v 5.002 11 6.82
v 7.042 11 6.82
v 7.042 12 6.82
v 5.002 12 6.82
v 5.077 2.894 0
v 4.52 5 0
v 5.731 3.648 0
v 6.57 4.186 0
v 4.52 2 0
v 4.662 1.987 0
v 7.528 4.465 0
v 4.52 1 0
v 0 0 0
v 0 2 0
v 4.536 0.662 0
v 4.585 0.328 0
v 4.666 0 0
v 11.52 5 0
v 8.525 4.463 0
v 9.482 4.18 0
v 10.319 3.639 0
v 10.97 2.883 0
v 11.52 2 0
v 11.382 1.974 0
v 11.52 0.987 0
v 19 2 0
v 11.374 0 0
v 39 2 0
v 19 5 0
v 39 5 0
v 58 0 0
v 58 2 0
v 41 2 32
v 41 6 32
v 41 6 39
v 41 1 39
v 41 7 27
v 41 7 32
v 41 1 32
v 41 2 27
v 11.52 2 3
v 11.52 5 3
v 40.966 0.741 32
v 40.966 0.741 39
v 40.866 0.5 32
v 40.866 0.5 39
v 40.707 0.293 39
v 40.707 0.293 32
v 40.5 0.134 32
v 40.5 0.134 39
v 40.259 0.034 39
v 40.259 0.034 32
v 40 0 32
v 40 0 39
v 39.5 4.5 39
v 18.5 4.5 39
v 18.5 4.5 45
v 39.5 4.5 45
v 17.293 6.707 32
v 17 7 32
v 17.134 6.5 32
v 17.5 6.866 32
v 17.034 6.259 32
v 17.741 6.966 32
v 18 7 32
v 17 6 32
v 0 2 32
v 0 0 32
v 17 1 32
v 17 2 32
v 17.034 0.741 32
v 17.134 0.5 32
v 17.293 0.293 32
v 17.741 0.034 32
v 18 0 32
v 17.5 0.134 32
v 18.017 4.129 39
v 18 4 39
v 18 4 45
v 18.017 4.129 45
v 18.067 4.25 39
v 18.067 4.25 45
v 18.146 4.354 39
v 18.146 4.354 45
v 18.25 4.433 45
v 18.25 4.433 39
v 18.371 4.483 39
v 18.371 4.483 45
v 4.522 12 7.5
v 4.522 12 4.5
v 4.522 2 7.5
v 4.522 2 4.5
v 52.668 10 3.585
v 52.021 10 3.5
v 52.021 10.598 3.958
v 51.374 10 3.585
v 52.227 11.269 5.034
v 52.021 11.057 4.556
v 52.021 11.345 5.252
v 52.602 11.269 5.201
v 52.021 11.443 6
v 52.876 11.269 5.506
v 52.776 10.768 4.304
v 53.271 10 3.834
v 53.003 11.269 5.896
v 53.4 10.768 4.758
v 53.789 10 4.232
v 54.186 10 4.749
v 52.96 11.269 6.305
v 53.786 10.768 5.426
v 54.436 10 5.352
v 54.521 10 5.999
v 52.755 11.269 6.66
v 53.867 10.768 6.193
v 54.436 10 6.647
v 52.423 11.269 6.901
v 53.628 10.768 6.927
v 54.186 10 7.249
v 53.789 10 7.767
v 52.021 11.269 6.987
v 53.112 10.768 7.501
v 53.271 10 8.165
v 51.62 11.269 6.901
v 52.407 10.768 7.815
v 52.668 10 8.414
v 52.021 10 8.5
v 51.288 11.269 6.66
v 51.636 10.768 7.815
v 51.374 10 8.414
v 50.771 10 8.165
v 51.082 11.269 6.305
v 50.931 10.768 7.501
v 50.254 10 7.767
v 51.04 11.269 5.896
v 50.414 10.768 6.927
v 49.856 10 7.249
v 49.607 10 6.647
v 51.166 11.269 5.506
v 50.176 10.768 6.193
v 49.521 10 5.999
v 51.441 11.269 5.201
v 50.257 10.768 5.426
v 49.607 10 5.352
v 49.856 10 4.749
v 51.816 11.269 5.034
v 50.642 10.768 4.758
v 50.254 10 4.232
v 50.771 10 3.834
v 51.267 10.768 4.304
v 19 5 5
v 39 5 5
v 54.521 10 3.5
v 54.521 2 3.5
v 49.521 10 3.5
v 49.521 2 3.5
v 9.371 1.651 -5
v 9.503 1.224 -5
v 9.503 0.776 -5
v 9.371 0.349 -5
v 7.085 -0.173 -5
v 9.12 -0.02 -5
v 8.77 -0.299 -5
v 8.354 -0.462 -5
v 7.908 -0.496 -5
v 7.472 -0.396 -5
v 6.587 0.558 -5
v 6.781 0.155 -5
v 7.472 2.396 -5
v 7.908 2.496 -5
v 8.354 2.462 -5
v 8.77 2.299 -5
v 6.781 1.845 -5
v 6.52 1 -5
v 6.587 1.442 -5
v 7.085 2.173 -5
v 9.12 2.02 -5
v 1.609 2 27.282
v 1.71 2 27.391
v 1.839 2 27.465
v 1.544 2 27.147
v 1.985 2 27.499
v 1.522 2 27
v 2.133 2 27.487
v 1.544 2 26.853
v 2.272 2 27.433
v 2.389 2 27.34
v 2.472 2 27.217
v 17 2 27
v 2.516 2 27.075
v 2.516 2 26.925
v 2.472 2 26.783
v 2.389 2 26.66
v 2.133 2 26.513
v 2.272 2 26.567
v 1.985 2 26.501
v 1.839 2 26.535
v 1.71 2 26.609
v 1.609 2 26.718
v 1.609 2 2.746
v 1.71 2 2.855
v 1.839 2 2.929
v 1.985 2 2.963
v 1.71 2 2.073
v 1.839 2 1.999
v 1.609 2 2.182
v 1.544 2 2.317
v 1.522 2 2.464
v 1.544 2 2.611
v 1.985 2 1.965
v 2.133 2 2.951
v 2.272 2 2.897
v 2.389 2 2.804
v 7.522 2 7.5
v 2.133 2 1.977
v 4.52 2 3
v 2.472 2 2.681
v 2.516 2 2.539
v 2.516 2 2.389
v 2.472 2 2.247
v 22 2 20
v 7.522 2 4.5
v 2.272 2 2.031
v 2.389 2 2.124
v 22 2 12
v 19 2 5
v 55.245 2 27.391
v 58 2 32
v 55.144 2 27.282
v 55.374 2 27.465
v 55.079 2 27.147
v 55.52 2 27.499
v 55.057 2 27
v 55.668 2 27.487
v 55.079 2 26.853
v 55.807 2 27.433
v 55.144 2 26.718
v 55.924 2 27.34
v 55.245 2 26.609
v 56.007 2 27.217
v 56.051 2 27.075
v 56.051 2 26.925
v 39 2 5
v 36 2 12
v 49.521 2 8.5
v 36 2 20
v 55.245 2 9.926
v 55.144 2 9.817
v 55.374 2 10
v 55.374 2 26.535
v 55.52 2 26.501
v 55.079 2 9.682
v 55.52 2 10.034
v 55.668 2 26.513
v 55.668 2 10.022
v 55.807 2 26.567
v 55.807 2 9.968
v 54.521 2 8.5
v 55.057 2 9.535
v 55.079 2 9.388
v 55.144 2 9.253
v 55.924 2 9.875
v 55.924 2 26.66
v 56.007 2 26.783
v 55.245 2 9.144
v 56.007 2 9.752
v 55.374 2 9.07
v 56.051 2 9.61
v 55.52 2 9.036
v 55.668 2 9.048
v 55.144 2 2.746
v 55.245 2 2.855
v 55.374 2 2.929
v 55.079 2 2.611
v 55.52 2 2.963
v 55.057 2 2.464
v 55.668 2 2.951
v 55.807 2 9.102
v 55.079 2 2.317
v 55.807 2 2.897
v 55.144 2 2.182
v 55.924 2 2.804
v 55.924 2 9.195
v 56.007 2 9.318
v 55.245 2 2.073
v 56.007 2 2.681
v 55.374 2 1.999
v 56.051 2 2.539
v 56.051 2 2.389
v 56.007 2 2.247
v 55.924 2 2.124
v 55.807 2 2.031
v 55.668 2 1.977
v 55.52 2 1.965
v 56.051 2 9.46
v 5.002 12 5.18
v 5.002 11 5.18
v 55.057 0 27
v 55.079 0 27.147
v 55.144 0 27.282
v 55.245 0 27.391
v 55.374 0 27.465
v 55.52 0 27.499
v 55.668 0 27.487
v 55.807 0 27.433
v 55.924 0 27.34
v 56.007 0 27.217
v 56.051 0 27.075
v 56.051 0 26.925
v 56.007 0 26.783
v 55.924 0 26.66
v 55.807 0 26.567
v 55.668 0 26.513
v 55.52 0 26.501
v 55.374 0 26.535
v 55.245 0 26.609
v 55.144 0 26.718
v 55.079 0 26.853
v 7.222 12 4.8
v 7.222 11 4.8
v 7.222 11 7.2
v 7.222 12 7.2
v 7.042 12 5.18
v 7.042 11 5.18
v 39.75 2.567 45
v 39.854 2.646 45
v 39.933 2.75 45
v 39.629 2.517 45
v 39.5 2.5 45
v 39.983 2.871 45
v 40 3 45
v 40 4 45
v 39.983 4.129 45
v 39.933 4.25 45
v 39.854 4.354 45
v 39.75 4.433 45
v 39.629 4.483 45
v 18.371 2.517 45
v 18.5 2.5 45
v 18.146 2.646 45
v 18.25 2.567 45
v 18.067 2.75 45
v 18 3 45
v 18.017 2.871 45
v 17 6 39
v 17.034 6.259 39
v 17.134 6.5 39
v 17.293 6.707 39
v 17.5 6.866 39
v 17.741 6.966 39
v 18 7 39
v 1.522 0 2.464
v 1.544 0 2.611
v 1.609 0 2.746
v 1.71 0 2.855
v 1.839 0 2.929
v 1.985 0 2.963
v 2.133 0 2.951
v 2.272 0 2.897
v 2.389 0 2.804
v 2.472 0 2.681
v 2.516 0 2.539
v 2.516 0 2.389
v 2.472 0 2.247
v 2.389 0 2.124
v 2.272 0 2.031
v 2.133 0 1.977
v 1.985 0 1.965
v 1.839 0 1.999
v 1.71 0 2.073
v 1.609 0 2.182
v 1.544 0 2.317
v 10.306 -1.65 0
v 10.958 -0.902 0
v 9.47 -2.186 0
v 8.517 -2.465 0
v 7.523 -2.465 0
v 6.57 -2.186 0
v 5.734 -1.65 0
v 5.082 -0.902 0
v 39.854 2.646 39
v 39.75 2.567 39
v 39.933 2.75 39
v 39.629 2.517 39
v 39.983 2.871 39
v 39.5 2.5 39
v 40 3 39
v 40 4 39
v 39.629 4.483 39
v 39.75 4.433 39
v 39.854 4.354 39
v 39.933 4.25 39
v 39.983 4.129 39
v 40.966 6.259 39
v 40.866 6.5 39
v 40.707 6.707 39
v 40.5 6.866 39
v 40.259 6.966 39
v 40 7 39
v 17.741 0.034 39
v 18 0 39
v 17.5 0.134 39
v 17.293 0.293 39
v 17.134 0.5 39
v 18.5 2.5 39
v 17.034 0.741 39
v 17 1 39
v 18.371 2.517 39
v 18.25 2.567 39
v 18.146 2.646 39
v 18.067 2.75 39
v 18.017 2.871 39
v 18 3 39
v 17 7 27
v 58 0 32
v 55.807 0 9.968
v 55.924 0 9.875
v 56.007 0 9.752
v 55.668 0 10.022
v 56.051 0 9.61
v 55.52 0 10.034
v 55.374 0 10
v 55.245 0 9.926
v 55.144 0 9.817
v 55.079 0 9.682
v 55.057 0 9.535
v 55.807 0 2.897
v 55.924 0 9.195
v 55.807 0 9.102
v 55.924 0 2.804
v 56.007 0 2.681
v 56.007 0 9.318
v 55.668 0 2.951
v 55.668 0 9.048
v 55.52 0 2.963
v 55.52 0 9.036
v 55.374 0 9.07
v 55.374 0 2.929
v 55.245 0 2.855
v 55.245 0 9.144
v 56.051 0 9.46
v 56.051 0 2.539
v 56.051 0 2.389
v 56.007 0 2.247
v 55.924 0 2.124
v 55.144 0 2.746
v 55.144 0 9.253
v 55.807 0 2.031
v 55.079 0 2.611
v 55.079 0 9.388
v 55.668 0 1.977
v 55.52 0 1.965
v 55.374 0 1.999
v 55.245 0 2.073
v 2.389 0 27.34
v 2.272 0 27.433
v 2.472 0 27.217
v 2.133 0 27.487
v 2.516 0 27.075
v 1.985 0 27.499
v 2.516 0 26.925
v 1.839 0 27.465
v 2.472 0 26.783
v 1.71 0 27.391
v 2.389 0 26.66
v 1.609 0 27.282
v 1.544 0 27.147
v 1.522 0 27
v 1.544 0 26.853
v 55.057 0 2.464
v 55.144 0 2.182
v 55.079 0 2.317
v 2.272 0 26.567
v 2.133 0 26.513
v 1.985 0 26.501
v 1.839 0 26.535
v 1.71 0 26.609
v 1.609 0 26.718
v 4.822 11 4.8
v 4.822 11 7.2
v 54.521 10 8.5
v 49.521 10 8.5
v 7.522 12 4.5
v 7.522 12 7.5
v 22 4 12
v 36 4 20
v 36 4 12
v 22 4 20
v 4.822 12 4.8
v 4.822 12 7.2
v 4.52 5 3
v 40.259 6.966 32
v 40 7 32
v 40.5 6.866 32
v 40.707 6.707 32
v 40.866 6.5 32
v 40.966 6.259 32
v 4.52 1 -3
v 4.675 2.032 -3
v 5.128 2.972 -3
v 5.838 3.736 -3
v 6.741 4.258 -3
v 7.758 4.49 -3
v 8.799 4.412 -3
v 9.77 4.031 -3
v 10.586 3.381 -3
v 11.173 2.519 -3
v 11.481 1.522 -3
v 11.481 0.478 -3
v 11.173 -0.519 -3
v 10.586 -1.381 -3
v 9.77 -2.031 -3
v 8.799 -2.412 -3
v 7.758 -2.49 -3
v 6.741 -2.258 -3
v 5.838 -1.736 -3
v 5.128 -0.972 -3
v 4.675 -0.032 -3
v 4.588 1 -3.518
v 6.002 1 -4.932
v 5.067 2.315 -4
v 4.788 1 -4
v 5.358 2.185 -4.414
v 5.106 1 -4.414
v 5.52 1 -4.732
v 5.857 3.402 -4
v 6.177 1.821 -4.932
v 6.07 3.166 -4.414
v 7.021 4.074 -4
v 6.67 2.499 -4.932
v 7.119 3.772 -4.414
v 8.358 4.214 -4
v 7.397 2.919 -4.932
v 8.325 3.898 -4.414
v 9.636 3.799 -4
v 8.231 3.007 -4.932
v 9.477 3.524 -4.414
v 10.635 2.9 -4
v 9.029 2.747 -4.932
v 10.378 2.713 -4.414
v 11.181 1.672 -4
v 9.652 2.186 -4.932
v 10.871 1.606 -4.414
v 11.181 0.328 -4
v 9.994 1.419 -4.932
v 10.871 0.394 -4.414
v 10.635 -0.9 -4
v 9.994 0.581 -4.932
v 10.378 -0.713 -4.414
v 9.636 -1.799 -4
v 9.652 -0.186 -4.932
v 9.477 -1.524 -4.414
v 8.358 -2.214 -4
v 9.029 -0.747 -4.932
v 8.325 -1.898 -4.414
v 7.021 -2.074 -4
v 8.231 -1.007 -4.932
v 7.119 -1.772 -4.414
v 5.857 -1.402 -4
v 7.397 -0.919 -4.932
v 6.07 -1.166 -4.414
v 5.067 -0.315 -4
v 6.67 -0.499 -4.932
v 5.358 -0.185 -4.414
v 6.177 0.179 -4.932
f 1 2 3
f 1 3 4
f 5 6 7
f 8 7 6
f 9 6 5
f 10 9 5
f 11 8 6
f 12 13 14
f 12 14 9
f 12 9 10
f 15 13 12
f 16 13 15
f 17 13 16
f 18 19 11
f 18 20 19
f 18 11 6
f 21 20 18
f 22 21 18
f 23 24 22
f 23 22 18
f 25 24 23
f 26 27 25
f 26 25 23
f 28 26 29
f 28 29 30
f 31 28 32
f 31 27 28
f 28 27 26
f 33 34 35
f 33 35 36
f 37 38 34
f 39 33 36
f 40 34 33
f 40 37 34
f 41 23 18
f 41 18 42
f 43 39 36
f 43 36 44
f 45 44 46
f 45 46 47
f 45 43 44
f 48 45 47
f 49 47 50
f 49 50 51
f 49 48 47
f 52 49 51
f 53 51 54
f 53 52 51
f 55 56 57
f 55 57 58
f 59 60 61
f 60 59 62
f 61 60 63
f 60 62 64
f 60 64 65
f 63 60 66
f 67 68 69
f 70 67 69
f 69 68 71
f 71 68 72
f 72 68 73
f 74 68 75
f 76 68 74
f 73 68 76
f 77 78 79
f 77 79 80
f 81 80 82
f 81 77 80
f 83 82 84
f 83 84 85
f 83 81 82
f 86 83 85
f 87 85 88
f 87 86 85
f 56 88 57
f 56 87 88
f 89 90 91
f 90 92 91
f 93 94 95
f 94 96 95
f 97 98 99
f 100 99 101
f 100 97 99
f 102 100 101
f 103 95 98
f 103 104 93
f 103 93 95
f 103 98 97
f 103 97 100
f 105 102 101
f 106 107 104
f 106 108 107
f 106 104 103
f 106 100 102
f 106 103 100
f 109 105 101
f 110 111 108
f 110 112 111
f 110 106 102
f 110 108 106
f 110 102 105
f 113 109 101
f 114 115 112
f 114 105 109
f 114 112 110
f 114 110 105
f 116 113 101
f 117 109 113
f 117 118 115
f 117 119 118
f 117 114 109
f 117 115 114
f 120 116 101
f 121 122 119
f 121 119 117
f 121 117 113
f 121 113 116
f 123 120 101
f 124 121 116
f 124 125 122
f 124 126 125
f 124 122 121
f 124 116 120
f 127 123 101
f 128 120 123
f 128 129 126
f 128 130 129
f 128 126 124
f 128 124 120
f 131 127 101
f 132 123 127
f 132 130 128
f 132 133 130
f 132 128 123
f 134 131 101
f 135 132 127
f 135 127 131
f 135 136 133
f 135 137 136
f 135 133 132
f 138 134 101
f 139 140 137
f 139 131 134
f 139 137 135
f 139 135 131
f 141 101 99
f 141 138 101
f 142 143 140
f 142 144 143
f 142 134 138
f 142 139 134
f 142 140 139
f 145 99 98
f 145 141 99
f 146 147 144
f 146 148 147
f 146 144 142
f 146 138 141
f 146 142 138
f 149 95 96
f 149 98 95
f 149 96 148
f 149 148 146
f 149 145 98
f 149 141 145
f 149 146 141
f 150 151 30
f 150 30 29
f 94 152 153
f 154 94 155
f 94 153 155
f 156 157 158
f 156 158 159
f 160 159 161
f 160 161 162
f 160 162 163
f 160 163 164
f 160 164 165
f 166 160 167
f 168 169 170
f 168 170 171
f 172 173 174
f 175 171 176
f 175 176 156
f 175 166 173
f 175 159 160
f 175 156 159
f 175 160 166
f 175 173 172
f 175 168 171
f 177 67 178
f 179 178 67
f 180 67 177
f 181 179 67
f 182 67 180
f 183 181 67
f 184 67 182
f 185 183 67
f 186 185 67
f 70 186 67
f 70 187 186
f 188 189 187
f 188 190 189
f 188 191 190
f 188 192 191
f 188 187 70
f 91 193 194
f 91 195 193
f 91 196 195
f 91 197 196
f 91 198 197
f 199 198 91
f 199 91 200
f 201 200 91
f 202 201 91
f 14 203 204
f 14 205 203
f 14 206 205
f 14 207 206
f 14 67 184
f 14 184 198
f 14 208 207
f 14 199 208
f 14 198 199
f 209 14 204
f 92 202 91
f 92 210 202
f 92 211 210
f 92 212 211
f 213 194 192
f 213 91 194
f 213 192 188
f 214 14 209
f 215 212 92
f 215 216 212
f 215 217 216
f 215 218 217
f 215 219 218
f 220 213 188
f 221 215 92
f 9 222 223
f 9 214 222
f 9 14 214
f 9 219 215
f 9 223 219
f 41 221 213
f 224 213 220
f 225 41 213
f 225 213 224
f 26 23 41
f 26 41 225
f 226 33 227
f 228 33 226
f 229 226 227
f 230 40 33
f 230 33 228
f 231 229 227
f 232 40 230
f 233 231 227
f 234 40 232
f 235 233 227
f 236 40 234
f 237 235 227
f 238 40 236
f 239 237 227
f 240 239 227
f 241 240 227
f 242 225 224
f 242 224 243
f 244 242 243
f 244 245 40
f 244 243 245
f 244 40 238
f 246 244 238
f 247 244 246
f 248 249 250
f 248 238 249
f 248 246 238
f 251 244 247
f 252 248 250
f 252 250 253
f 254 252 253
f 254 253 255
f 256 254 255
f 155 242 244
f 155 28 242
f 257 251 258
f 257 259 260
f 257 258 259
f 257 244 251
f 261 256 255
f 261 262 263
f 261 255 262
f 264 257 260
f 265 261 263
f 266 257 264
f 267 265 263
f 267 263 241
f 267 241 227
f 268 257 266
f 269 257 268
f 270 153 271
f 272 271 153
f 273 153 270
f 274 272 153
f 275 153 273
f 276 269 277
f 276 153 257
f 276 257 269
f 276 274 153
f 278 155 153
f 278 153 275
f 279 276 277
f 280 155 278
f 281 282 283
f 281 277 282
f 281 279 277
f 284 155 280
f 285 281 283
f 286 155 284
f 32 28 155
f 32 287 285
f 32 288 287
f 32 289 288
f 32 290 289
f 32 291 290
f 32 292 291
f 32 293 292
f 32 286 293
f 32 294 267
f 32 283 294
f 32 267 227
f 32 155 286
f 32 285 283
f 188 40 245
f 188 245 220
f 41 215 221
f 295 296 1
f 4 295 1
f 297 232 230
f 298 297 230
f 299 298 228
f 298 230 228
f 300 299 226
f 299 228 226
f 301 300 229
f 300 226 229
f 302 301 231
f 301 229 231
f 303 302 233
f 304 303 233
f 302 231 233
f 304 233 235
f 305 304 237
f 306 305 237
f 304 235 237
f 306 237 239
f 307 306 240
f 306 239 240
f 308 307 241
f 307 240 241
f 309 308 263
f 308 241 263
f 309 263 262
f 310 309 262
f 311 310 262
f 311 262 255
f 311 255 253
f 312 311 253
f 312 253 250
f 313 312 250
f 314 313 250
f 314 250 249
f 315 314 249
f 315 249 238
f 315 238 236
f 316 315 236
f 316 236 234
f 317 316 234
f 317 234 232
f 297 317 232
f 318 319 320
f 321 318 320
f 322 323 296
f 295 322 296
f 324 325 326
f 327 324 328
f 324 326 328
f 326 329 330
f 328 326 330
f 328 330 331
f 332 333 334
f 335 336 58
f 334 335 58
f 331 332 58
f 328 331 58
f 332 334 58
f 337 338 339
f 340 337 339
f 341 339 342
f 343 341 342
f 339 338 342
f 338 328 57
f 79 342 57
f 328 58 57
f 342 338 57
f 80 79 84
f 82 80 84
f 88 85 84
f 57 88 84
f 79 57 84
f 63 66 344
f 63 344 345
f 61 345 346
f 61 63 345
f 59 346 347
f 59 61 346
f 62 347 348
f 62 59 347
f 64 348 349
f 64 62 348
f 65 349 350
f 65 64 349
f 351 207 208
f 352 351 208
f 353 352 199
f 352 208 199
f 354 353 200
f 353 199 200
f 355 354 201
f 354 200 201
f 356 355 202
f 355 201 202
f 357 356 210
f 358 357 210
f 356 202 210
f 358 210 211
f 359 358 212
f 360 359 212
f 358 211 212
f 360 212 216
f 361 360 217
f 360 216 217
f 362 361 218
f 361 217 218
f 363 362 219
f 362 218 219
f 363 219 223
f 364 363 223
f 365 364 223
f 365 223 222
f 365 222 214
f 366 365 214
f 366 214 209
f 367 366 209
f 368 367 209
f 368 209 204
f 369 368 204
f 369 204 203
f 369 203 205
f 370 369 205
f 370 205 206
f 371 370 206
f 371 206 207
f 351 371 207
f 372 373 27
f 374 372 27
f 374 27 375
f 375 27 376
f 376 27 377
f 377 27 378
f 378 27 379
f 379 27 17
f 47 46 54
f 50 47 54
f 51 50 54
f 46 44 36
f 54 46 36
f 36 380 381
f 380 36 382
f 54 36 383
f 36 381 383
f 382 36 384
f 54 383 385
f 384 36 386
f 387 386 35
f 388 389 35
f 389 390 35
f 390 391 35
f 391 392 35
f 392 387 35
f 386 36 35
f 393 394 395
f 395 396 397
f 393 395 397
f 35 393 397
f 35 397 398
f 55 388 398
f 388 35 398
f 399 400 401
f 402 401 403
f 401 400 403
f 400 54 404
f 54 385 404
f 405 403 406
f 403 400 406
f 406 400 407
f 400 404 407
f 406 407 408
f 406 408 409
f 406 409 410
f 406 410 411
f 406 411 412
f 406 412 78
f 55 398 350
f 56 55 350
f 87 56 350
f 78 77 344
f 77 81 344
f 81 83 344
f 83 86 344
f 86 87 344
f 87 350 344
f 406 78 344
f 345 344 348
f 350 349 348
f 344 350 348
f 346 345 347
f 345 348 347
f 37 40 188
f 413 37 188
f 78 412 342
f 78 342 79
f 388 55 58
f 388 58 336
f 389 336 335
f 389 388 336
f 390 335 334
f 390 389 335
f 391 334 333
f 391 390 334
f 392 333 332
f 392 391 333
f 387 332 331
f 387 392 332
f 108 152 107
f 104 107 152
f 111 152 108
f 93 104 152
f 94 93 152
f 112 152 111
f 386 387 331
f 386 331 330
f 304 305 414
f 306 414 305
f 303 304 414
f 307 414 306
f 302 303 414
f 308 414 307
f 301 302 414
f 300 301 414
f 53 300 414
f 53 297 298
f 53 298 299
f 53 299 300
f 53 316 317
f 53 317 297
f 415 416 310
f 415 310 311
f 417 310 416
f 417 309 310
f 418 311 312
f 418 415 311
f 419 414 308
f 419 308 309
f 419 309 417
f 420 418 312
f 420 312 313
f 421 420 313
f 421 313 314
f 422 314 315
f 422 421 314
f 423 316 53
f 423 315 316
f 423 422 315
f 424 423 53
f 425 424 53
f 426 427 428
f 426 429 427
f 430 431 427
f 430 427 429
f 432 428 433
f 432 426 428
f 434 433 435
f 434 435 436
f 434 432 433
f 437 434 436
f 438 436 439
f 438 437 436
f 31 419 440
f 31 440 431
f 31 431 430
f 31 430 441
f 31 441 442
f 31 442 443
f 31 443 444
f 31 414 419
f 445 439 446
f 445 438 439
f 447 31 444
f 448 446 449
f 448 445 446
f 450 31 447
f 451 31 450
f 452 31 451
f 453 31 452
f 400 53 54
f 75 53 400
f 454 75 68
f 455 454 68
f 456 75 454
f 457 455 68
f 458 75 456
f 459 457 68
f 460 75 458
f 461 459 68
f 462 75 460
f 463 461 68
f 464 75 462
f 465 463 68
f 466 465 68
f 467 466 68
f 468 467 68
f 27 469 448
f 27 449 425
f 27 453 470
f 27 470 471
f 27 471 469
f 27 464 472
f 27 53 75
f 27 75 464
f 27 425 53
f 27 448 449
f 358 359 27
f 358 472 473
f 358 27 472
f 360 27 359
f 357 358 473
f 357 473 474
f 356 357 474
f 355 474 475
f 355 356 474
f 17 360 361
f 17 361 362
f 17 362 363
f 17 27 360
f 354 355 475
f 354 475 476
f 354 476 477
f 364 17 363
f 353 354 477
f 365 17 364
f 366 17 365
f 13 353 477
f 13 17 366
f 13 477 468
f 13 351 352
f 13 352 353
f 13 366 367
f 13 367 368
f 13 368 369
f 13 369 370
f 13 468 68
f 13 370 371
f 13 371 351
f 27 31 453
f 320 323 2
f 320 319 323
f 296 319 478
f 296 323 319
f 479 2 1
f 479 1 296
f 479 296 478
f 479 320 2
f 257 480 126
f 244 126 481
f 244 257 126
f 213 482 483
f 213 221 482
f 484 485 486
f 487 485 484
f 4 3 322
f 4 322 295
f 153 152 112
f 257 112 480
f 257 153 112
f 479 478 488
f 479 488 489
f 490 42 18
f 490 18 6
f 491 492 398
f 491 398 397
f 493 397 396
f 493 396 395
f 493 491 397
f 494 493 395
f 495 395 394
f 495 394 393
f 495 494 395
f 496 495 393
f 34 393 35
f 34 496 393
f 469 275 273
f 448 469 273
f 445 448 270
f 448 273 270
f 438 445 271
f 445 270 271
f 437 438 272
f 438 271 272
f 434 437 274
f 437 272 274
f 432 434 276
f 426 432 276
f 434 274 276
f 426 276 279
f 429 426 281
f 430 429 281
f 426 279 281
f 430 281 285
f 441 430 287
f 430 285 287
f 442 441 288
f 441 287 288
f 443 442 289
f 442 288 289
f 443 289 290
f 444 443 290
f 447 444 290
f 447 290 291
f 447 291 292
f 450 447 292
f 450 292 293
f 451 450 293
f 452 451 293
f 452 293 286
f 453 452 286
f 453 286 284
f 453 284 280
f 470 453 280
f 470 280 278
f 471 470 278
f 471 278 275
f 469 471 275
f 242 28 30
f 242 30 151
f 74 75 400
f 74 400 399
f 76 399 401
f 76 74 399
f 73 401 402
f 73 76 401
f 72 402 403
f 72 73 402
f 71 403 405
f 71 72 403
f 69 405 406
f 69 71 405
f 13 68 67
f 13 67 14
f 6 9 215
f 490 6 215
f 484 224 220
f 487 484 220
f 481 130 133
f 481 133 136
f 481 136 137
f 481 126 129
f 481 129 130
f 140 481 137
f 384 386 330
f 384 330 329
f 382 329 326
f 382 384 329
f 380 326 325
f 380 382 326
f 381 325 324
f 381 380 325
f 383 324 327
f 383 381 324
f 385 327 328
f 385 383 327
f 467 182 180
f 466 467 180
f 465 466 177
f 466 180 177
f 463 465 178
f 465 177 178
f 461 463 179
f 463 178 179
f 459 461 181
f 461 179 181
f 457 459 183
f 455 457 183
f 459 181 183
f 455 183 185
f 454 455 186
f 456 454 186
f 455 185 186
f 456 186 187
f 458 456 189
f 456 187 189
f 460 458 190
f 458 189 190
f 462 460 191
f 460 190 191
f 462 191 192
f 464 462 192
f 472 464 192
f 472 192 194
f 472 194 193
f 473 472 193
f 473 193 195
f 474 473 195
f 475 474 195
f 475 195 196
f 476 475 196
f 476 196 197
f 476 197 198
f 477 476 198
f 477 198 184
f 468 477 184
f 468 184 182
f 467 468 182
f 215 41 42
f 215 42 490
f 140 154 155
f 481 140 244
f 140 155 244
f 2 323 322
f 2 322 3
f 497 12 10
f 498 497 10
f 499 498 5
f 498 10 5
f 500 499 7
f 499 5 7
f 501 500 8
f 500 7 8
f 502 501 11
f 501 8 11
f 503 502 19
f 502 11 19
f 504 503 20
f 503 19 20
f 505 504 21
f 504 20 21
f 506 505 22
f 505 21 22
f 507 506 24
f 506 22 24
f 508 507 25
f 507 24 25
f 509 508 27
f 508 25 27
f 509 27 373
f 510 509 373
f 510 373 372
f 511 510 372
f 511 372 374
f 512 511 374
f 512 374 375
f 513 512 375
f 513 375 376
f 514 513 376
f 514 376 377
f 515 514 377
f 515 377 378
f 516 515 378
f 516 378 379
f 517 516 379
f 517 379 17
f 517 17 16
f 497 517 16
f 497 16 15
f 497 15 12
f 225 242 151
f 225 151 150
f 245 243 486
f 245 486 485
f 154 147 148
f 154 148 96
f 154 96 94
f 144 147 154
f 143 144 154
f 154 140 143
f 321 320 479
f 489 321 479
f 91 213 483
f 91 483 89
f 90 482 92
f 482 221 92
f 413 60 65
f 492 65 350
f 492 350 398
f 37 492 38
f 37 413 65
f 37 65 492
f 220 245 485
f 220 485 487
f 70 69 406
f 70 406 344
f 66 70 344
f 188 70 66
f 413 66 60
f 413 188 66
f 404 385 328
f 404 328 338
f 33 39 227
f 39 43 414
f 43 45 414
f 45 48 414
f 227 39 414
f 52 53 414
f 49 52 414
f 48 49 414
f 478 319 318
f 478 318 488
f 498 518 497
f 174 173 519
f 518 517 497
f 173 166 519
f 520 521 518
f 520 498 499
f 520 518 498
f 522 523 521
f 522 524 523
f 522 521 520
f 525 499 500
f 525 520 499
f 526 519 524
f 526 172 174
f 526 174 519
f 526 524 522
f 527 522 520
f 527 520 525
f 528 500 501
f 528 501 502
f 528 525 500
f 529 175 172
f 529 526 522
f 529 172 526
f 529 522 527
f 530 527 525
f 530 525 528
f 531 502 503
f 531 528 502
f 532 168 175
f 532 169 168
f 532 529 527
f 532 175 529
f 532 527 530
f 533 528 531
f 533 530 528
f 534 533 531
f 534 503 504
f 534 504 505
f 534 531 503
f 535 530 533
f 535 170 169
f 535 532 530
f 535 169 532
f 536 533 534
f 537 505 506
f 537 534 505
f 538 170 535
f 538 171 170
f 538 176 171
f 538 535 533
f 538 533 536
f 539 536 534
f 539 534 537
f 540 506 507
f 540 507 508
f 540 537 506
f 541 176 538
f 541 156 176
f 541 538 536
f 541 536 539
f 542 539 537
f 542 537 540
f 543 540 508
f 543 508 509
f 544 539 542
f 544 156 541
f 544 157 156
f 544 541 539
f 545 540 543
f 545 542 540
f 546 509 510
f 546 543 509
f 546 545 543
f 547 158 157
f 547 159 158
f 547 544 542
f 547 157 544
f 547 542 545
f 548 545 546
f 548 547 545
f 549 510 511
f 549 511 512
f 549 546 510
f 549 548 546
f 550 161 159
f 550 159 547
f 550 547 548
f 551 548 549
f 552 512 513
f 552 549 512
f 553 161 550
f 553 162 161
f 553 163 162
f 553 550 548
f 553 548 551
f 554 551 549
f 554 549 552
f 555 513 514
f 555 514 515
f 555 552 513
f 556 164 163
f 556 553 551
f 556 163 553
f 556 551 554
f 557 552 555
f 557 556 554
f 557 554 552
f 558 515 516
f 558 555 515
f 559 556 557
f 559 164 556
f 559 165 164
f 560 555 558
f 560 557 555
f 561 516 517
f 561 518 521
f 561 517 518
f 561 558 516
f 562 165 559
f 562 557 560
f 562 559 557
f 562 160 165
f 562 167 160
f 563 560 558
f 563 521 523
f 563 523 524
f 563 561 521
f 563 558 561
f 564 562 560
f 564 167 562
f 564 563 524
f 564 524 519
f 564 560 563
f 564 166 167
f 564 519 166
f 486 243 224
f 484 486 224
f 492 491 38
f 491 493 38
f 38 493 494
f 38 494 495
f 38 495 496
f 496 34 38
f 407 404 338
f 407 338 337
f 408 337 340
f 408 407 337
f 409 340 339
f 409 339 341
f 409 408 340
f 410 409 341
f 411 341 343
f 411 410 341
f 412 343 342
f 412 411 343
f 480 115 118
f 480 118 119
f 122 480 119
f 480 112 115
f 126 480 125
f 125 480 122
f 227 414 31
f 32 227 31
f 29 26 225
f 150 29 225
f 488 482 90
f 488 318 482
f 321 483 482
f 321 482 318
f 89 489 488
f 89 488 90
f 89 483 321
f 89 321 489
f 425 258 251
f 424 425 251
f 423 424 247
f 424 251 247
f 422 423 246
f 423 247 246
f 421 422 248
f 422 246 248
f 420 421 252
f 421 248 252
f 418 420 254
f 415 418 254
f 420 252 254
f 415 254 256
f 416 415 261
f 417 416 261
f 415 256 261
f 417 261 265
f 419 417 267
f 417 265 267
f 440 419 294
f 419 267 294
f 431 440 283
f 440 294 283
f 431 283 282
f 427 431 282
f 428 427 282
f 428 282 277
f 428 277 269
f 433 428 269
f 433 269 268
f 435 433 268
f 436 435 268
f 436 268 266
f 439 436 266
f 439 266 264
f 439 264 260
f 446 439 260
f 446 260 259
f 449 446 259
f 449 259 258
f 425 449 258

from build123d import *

# Parameters (mm, degrees)
SKETCH1_W           = 58
SKETCH1_H           = 32
EXTRUDE1_DEPTH      = 2
CUT_EXTRUDE1_REACH  = 4
SKETCH2_R           = 0.5
SKETCH3_W           = 5
SKETCH3_H           = 5
EXTRUDE2_DEPTH      = 8
SKETCH10_W          = 3
SKETCH10_H          = 3
FLASH_LED_BOX_DEPTH = 9
SKETCH12_W          = 3
SKETCH12_H          = 3
SKETCH12_W_2        = 2.4
SKETCH12_H_2        = 2.4
EXTRUDE4_DEPTH      = 1
SKETCH13_W          = 2.04
SKETCH13_H          = 1.64
EXTRUDE5_DEPTH      = 1
SKETCH14_W          = 24
SKETCH14_H          = 5
EXTRUDE6_DEPTH      = 5
EXTRUDE7_DEPTH      = 7
EXTRUDE8_DEPTH      = 6
SKETCH18_W          = 20
SKETCH18_H          = 5
TO_LCD_DEPTH        = 3
SKETCH19_W          = 14
SKETCH19_H          = 8
FLASH_MEMORY_DEPTH  = 2
SKETCH20_W          = 7
SKETCH20_H          = 3
EXTRUDE11_DEPTH     = 3
SKETCH21_R          = 3.5
EXTRUDE12_DEPTH     = 5
FILLET1_R           = 2


with BuildPart() as part:
    # Sketch1 → Extrude1 (new body)
    with BuildSketch(Plane(origin=(0, 0, 0), x_dir=(1, 0, 0), z_dir=(0, 1, 0))):
        with Locations((29, -16)):
            Rectangle(SKETCH1_W, SKETCH1_H)
    extrude(amount=EXTRUDE1_DEPTH)

    # Sketch2 → Cut-Extrude1 (cut, up to next)
    with BuildSketch(Plane(origin=(0, 2, 0), x_dir=(-1, 0, 0), z_dir=(0, 1, 0)), mode=Mode.PRIVATE) as cut_extrude1_sk1:
        with Locations((-55.557, 2.464)):
            Circle(SKETCH2_R)
    cut_extrude1_tool1 = extrude(cut_extrude1_sk1.sketch, amount=-CUT_EXTRUDE1_REACH, mode=Mode.PRIVATE) & part.part
    add(cut_extrude1_tool1.solids().sort_by_distance((55.557, 2, 2.464))[0], mode=Mode.SUBTRACT)
    # Sketch2 → Cut-Extrude1 (cut, up to next)
    with BuildSketch(Plane(origin=(0, 2, 0), x_dir=(-1, 0, 0), z_dir=(0, 1, 0)), mode=Mode.PRIVATE) as cut_extrude1_sk2:
        with Locations((-55.557, 9.535)):
            Circle(SKETCH2_R)
    cut_extrude1_tool2 = extrude(cut_extrude1_sk2.sketch, amount=-CUT_EXTRUDE1_REACH, mode=Mode.PRIVATE) & part.part
    add(cut_extrude1_tool2.solids().sort_by_distance((55.557, 2, 9.535))[0], mode=Mode.SUBTRACT)
    # Sketch2 → Cut-Extrude1 (cut, up to next)
    with BuildSketch(Plane(origin=(0, 2, 0), x_dir=(-1, 0, 0), z_dir=(0, 1, 0)), mode=Mode.PRIVATE) as cut_extrude1_sk3:
        with Locations((-55.557, 27)):
            Circle(SKETCH2_R)
    cut_extrude1_tool3 = extrude(cut_extrude1_sk3.sketch, amount=-CUT_EXTRUDE1_REACH, mode=Mode.PRIVATE) & part.part
    add(cut_extrude1_tool3.solids().sort_by_distance((55.557, 2, 27))[0], mode=Mode.SUBTRACT)
    # Sketch2 → Cut-Extrude1 (cut, up to next)
    with BuildSketch(Plane(origin=(0, 2, 0), x_dir=(-1, 0, 0), z_dir=(0, 1, 0)), mode=Mode.PRIVATE) as cut_extrude1_sk4:
        with Locations((-2.022, 27)):
            Circle(SKETCH2_R)
    cut_extrude1_tool4 = extrude(cut_extrude1_sk4.sketch, amount=-CUT_EXTRUDE1_REACH, mode=Mode.PRIVATE) & part.part
    add(cut_extrude1_tool4.solids().sort_by_distance((2.022, 2, 27))[0], mode=Mode.SUBTRACT)
    # Sketch2 → Cut-Extrude1 (cut, up to next)
    with BuildSketch(Plane(origin=(0, 2, 0), x_dir=(-1, 0, 0), z_dir=(0, 1, 0)), mode=Mode.PRIVATE) as cut_extrude1_sk5:
        with Locations((-2.022, 2.464)):
            Circle(SKETCH2_R)
    cut_extrude1_tool5 = extrude(cut_extrude1_sk5.sketch, amount=-CUT_EXTRUDE1_REACH, mode=Mode.PRIVATE) & part.part
    add(cut_extrude1_tool5.solids().sort_by_distance((2.022, 2, 2.464))[0], mode=Mode.SUBTRACT)

    # Sketch3 → Extrude2 (add)
    with BuildSketch(Plane(origin=(0, 2, 0), x_dir=(-1, 0, 0), z_dir=(0, 1, 0))):
        with Locations((-52.021432188, 5.9995)):
            Rectangle(SKETCH3_W, SKETCH3_H)
    extrude(amount=EXTRUDE2_DEPTH)

    # Sketch6 → Revolve1 (revolve)
    with BuildSketch(Plane(origin=(52.021432188, 0, 0), x_dir=(0, 0, -1), z_dir=(1, 0, 0))):
        with BuildLine():
            Line((-3.4995, 10), (-5.9995, 10))
            Line((-5.9995, 10), (-5.9995, 11.443375673))
            ThreePointArc((-5.9995, 11.443375673), (-4.556124327, 11.056624327), (-3.4995, 10))
        make_face()
    revolve(axis=Axis((52.021432188, 11.443375673, 5.9995), (0, -1, 0)))

    # Sketch10 → flash led box (add)
    with BuildSketch(Plane(origin=(0, 2, 0), x_dir=(-1, 0, 0), z_dir=(0, 1, 0))):
        with Locations((-6.022, 6)):
            Rectangle(SKETCH10_W, SKETCH10_H)
    extrude(amount=FLASH_LED_BOX_DEPTH)

    # Sketch12 → Extrude4 (add)
    with BuildSketch(Plane(origin=(0, 11, 0), x_dir=(-1, 0, 0), z_dir=(0, 1, 0))):
        with Locations((-6.022, 6)):
            Rectangle(SKETCH12_W, SKETCH12_H)
        with Locations((-6.022, 6)):
            Rectangle(SKETCH12_W_2, SKETCH12_H_2, mode=Mode.SUBTRACT)
    extrude(amount=EXTRUDE4_DEPTH)

    # Sketch13 → Extrude5 (add)
    with BuildSketch(Plane(origin=(0, 11, 0), x_dir=(-1, 0, 0), z_dir=(0, 1, 0))):
        with Locations((-6.022, 6)):
            Rectangle(SKETCH13_W, SKETCH13_H)
    extrude(amount=EXTRUDE5_DEPTH)

    # Sketch14 → Extrude6 (add)
    with BuildSketch(Plane(origin=(0, 2, 0), x_dir=(-1, 0, 0), z_dir=(0, 1, 0))):
        with Locations((-29, 29.5)):
            Rectangle(SKETCH14_W, SKETCH14_H)
    extrude(amount=EXTRUDE6_DEPTH)

    # Sketch16 → Extrude7 (add)
    with BuildSketch(Plane.XY.offset(32)):
        with BuildLine():
            Line((18, 7), (40, 7))
            ThreePointArc((40, 7), (40.707106781, 6.707106781), (41, 6))
            Line((41, 6), (41, 1))
            ThreePointArc((41, 1), (40.707106781, 0.292893219), (40, 0))
            Line((40, 0), (18, 0))
            ThreePointArc((18, 0), (17.292893219, 0.292893219), (17, 1))
            Line((17, 1), (17, 6))
            ThreePointArc((17, 6), (17.292893219, 6.707106781), (18, 7))
        make_face()
    extrude(amount=EXTRUDE7_DEPTH)

    # Sketch17 → Extrude8 (add)
    with BuildSketch(Plane.XY.offset(39)):
        with BuildLine():
            Line((18.5, 4.5), (39.5, 4.5))
            ThreePointArc((39.5, 4.5), (39.853553391, 4.353553391), (40, 4))
            Line((40, 4), (40, 3))
            ThreePointArc((40, 3), (39.853553391, 2.646446609), (39.5, 2.5))
            Line((39.5, 2.5), (18.5, 2.5))
            ThreePointArc((18.5, 2.5), (18.146446609, 2.646446609), (18, 3))
            Line((18, 3), (18, 4))
            ThreePointArc((18, 4), (18.146446609, 4.353553391), (18.5, 4.5))
        make_face()
    extrude(amount=EXTRUDE8_DEPTH)

    # Sketch18 → to lcd (add)
    with BuildSketch(Plane(origin=(0, 2, 0), x_dir=(-1, 0, 0), z_dir=(0, 1, 0))):
        with Locations((-29, 2.5)):
            Rectangle(SKETCH18_W, SKETCH18_H)
    extrude(amount=TO_LCD_DEPTH)

    # Sketch19 → flash memory (add)
    with BuildSketch(Plane(origin=(0, 2, 0), x_dir=(-1, 0, 0), z_dir=(0, 1, 0))):
        with Locations((-29, 16)):
            Rectangle(SKETCH19_W, SKETCH19_H)
    extrude(amount=FLASH_MEMORY_DEPTH)

    # Sketch20 → Extrude11 (add)
    with BuildSketch(Plane(origin=(0, 2, 0), x_dir=(-1, 0, 0), z_dir=(0, 1, 0))):
        with Locations((-8.02, 1.5)):
            Rectangle(SKETCH20_W, SKETCH20_H)
    extrude(amount=EXTRUDE11_DEPTH)

    # Sketch21 → Extrude12 (add)
    with BuildSketch(Plane(origin=(0, 0, 0), x_dir=(-1, 0, 0), z_dir=(0, 0, -1))):
        with Locations((-8.02, 1)):
            Circle(SKETCH21_R)
    extrude(amount=EXTRUDE12_DEPTH)

    # Fillet1
    fillet1_edges = [part.edges().sort_by_distance(p)[0] for p in [
        (11.52, 1, -5),
    ]]
    fillet(fillet1_edges, radius=FILLET1_R)


solid = part.part
